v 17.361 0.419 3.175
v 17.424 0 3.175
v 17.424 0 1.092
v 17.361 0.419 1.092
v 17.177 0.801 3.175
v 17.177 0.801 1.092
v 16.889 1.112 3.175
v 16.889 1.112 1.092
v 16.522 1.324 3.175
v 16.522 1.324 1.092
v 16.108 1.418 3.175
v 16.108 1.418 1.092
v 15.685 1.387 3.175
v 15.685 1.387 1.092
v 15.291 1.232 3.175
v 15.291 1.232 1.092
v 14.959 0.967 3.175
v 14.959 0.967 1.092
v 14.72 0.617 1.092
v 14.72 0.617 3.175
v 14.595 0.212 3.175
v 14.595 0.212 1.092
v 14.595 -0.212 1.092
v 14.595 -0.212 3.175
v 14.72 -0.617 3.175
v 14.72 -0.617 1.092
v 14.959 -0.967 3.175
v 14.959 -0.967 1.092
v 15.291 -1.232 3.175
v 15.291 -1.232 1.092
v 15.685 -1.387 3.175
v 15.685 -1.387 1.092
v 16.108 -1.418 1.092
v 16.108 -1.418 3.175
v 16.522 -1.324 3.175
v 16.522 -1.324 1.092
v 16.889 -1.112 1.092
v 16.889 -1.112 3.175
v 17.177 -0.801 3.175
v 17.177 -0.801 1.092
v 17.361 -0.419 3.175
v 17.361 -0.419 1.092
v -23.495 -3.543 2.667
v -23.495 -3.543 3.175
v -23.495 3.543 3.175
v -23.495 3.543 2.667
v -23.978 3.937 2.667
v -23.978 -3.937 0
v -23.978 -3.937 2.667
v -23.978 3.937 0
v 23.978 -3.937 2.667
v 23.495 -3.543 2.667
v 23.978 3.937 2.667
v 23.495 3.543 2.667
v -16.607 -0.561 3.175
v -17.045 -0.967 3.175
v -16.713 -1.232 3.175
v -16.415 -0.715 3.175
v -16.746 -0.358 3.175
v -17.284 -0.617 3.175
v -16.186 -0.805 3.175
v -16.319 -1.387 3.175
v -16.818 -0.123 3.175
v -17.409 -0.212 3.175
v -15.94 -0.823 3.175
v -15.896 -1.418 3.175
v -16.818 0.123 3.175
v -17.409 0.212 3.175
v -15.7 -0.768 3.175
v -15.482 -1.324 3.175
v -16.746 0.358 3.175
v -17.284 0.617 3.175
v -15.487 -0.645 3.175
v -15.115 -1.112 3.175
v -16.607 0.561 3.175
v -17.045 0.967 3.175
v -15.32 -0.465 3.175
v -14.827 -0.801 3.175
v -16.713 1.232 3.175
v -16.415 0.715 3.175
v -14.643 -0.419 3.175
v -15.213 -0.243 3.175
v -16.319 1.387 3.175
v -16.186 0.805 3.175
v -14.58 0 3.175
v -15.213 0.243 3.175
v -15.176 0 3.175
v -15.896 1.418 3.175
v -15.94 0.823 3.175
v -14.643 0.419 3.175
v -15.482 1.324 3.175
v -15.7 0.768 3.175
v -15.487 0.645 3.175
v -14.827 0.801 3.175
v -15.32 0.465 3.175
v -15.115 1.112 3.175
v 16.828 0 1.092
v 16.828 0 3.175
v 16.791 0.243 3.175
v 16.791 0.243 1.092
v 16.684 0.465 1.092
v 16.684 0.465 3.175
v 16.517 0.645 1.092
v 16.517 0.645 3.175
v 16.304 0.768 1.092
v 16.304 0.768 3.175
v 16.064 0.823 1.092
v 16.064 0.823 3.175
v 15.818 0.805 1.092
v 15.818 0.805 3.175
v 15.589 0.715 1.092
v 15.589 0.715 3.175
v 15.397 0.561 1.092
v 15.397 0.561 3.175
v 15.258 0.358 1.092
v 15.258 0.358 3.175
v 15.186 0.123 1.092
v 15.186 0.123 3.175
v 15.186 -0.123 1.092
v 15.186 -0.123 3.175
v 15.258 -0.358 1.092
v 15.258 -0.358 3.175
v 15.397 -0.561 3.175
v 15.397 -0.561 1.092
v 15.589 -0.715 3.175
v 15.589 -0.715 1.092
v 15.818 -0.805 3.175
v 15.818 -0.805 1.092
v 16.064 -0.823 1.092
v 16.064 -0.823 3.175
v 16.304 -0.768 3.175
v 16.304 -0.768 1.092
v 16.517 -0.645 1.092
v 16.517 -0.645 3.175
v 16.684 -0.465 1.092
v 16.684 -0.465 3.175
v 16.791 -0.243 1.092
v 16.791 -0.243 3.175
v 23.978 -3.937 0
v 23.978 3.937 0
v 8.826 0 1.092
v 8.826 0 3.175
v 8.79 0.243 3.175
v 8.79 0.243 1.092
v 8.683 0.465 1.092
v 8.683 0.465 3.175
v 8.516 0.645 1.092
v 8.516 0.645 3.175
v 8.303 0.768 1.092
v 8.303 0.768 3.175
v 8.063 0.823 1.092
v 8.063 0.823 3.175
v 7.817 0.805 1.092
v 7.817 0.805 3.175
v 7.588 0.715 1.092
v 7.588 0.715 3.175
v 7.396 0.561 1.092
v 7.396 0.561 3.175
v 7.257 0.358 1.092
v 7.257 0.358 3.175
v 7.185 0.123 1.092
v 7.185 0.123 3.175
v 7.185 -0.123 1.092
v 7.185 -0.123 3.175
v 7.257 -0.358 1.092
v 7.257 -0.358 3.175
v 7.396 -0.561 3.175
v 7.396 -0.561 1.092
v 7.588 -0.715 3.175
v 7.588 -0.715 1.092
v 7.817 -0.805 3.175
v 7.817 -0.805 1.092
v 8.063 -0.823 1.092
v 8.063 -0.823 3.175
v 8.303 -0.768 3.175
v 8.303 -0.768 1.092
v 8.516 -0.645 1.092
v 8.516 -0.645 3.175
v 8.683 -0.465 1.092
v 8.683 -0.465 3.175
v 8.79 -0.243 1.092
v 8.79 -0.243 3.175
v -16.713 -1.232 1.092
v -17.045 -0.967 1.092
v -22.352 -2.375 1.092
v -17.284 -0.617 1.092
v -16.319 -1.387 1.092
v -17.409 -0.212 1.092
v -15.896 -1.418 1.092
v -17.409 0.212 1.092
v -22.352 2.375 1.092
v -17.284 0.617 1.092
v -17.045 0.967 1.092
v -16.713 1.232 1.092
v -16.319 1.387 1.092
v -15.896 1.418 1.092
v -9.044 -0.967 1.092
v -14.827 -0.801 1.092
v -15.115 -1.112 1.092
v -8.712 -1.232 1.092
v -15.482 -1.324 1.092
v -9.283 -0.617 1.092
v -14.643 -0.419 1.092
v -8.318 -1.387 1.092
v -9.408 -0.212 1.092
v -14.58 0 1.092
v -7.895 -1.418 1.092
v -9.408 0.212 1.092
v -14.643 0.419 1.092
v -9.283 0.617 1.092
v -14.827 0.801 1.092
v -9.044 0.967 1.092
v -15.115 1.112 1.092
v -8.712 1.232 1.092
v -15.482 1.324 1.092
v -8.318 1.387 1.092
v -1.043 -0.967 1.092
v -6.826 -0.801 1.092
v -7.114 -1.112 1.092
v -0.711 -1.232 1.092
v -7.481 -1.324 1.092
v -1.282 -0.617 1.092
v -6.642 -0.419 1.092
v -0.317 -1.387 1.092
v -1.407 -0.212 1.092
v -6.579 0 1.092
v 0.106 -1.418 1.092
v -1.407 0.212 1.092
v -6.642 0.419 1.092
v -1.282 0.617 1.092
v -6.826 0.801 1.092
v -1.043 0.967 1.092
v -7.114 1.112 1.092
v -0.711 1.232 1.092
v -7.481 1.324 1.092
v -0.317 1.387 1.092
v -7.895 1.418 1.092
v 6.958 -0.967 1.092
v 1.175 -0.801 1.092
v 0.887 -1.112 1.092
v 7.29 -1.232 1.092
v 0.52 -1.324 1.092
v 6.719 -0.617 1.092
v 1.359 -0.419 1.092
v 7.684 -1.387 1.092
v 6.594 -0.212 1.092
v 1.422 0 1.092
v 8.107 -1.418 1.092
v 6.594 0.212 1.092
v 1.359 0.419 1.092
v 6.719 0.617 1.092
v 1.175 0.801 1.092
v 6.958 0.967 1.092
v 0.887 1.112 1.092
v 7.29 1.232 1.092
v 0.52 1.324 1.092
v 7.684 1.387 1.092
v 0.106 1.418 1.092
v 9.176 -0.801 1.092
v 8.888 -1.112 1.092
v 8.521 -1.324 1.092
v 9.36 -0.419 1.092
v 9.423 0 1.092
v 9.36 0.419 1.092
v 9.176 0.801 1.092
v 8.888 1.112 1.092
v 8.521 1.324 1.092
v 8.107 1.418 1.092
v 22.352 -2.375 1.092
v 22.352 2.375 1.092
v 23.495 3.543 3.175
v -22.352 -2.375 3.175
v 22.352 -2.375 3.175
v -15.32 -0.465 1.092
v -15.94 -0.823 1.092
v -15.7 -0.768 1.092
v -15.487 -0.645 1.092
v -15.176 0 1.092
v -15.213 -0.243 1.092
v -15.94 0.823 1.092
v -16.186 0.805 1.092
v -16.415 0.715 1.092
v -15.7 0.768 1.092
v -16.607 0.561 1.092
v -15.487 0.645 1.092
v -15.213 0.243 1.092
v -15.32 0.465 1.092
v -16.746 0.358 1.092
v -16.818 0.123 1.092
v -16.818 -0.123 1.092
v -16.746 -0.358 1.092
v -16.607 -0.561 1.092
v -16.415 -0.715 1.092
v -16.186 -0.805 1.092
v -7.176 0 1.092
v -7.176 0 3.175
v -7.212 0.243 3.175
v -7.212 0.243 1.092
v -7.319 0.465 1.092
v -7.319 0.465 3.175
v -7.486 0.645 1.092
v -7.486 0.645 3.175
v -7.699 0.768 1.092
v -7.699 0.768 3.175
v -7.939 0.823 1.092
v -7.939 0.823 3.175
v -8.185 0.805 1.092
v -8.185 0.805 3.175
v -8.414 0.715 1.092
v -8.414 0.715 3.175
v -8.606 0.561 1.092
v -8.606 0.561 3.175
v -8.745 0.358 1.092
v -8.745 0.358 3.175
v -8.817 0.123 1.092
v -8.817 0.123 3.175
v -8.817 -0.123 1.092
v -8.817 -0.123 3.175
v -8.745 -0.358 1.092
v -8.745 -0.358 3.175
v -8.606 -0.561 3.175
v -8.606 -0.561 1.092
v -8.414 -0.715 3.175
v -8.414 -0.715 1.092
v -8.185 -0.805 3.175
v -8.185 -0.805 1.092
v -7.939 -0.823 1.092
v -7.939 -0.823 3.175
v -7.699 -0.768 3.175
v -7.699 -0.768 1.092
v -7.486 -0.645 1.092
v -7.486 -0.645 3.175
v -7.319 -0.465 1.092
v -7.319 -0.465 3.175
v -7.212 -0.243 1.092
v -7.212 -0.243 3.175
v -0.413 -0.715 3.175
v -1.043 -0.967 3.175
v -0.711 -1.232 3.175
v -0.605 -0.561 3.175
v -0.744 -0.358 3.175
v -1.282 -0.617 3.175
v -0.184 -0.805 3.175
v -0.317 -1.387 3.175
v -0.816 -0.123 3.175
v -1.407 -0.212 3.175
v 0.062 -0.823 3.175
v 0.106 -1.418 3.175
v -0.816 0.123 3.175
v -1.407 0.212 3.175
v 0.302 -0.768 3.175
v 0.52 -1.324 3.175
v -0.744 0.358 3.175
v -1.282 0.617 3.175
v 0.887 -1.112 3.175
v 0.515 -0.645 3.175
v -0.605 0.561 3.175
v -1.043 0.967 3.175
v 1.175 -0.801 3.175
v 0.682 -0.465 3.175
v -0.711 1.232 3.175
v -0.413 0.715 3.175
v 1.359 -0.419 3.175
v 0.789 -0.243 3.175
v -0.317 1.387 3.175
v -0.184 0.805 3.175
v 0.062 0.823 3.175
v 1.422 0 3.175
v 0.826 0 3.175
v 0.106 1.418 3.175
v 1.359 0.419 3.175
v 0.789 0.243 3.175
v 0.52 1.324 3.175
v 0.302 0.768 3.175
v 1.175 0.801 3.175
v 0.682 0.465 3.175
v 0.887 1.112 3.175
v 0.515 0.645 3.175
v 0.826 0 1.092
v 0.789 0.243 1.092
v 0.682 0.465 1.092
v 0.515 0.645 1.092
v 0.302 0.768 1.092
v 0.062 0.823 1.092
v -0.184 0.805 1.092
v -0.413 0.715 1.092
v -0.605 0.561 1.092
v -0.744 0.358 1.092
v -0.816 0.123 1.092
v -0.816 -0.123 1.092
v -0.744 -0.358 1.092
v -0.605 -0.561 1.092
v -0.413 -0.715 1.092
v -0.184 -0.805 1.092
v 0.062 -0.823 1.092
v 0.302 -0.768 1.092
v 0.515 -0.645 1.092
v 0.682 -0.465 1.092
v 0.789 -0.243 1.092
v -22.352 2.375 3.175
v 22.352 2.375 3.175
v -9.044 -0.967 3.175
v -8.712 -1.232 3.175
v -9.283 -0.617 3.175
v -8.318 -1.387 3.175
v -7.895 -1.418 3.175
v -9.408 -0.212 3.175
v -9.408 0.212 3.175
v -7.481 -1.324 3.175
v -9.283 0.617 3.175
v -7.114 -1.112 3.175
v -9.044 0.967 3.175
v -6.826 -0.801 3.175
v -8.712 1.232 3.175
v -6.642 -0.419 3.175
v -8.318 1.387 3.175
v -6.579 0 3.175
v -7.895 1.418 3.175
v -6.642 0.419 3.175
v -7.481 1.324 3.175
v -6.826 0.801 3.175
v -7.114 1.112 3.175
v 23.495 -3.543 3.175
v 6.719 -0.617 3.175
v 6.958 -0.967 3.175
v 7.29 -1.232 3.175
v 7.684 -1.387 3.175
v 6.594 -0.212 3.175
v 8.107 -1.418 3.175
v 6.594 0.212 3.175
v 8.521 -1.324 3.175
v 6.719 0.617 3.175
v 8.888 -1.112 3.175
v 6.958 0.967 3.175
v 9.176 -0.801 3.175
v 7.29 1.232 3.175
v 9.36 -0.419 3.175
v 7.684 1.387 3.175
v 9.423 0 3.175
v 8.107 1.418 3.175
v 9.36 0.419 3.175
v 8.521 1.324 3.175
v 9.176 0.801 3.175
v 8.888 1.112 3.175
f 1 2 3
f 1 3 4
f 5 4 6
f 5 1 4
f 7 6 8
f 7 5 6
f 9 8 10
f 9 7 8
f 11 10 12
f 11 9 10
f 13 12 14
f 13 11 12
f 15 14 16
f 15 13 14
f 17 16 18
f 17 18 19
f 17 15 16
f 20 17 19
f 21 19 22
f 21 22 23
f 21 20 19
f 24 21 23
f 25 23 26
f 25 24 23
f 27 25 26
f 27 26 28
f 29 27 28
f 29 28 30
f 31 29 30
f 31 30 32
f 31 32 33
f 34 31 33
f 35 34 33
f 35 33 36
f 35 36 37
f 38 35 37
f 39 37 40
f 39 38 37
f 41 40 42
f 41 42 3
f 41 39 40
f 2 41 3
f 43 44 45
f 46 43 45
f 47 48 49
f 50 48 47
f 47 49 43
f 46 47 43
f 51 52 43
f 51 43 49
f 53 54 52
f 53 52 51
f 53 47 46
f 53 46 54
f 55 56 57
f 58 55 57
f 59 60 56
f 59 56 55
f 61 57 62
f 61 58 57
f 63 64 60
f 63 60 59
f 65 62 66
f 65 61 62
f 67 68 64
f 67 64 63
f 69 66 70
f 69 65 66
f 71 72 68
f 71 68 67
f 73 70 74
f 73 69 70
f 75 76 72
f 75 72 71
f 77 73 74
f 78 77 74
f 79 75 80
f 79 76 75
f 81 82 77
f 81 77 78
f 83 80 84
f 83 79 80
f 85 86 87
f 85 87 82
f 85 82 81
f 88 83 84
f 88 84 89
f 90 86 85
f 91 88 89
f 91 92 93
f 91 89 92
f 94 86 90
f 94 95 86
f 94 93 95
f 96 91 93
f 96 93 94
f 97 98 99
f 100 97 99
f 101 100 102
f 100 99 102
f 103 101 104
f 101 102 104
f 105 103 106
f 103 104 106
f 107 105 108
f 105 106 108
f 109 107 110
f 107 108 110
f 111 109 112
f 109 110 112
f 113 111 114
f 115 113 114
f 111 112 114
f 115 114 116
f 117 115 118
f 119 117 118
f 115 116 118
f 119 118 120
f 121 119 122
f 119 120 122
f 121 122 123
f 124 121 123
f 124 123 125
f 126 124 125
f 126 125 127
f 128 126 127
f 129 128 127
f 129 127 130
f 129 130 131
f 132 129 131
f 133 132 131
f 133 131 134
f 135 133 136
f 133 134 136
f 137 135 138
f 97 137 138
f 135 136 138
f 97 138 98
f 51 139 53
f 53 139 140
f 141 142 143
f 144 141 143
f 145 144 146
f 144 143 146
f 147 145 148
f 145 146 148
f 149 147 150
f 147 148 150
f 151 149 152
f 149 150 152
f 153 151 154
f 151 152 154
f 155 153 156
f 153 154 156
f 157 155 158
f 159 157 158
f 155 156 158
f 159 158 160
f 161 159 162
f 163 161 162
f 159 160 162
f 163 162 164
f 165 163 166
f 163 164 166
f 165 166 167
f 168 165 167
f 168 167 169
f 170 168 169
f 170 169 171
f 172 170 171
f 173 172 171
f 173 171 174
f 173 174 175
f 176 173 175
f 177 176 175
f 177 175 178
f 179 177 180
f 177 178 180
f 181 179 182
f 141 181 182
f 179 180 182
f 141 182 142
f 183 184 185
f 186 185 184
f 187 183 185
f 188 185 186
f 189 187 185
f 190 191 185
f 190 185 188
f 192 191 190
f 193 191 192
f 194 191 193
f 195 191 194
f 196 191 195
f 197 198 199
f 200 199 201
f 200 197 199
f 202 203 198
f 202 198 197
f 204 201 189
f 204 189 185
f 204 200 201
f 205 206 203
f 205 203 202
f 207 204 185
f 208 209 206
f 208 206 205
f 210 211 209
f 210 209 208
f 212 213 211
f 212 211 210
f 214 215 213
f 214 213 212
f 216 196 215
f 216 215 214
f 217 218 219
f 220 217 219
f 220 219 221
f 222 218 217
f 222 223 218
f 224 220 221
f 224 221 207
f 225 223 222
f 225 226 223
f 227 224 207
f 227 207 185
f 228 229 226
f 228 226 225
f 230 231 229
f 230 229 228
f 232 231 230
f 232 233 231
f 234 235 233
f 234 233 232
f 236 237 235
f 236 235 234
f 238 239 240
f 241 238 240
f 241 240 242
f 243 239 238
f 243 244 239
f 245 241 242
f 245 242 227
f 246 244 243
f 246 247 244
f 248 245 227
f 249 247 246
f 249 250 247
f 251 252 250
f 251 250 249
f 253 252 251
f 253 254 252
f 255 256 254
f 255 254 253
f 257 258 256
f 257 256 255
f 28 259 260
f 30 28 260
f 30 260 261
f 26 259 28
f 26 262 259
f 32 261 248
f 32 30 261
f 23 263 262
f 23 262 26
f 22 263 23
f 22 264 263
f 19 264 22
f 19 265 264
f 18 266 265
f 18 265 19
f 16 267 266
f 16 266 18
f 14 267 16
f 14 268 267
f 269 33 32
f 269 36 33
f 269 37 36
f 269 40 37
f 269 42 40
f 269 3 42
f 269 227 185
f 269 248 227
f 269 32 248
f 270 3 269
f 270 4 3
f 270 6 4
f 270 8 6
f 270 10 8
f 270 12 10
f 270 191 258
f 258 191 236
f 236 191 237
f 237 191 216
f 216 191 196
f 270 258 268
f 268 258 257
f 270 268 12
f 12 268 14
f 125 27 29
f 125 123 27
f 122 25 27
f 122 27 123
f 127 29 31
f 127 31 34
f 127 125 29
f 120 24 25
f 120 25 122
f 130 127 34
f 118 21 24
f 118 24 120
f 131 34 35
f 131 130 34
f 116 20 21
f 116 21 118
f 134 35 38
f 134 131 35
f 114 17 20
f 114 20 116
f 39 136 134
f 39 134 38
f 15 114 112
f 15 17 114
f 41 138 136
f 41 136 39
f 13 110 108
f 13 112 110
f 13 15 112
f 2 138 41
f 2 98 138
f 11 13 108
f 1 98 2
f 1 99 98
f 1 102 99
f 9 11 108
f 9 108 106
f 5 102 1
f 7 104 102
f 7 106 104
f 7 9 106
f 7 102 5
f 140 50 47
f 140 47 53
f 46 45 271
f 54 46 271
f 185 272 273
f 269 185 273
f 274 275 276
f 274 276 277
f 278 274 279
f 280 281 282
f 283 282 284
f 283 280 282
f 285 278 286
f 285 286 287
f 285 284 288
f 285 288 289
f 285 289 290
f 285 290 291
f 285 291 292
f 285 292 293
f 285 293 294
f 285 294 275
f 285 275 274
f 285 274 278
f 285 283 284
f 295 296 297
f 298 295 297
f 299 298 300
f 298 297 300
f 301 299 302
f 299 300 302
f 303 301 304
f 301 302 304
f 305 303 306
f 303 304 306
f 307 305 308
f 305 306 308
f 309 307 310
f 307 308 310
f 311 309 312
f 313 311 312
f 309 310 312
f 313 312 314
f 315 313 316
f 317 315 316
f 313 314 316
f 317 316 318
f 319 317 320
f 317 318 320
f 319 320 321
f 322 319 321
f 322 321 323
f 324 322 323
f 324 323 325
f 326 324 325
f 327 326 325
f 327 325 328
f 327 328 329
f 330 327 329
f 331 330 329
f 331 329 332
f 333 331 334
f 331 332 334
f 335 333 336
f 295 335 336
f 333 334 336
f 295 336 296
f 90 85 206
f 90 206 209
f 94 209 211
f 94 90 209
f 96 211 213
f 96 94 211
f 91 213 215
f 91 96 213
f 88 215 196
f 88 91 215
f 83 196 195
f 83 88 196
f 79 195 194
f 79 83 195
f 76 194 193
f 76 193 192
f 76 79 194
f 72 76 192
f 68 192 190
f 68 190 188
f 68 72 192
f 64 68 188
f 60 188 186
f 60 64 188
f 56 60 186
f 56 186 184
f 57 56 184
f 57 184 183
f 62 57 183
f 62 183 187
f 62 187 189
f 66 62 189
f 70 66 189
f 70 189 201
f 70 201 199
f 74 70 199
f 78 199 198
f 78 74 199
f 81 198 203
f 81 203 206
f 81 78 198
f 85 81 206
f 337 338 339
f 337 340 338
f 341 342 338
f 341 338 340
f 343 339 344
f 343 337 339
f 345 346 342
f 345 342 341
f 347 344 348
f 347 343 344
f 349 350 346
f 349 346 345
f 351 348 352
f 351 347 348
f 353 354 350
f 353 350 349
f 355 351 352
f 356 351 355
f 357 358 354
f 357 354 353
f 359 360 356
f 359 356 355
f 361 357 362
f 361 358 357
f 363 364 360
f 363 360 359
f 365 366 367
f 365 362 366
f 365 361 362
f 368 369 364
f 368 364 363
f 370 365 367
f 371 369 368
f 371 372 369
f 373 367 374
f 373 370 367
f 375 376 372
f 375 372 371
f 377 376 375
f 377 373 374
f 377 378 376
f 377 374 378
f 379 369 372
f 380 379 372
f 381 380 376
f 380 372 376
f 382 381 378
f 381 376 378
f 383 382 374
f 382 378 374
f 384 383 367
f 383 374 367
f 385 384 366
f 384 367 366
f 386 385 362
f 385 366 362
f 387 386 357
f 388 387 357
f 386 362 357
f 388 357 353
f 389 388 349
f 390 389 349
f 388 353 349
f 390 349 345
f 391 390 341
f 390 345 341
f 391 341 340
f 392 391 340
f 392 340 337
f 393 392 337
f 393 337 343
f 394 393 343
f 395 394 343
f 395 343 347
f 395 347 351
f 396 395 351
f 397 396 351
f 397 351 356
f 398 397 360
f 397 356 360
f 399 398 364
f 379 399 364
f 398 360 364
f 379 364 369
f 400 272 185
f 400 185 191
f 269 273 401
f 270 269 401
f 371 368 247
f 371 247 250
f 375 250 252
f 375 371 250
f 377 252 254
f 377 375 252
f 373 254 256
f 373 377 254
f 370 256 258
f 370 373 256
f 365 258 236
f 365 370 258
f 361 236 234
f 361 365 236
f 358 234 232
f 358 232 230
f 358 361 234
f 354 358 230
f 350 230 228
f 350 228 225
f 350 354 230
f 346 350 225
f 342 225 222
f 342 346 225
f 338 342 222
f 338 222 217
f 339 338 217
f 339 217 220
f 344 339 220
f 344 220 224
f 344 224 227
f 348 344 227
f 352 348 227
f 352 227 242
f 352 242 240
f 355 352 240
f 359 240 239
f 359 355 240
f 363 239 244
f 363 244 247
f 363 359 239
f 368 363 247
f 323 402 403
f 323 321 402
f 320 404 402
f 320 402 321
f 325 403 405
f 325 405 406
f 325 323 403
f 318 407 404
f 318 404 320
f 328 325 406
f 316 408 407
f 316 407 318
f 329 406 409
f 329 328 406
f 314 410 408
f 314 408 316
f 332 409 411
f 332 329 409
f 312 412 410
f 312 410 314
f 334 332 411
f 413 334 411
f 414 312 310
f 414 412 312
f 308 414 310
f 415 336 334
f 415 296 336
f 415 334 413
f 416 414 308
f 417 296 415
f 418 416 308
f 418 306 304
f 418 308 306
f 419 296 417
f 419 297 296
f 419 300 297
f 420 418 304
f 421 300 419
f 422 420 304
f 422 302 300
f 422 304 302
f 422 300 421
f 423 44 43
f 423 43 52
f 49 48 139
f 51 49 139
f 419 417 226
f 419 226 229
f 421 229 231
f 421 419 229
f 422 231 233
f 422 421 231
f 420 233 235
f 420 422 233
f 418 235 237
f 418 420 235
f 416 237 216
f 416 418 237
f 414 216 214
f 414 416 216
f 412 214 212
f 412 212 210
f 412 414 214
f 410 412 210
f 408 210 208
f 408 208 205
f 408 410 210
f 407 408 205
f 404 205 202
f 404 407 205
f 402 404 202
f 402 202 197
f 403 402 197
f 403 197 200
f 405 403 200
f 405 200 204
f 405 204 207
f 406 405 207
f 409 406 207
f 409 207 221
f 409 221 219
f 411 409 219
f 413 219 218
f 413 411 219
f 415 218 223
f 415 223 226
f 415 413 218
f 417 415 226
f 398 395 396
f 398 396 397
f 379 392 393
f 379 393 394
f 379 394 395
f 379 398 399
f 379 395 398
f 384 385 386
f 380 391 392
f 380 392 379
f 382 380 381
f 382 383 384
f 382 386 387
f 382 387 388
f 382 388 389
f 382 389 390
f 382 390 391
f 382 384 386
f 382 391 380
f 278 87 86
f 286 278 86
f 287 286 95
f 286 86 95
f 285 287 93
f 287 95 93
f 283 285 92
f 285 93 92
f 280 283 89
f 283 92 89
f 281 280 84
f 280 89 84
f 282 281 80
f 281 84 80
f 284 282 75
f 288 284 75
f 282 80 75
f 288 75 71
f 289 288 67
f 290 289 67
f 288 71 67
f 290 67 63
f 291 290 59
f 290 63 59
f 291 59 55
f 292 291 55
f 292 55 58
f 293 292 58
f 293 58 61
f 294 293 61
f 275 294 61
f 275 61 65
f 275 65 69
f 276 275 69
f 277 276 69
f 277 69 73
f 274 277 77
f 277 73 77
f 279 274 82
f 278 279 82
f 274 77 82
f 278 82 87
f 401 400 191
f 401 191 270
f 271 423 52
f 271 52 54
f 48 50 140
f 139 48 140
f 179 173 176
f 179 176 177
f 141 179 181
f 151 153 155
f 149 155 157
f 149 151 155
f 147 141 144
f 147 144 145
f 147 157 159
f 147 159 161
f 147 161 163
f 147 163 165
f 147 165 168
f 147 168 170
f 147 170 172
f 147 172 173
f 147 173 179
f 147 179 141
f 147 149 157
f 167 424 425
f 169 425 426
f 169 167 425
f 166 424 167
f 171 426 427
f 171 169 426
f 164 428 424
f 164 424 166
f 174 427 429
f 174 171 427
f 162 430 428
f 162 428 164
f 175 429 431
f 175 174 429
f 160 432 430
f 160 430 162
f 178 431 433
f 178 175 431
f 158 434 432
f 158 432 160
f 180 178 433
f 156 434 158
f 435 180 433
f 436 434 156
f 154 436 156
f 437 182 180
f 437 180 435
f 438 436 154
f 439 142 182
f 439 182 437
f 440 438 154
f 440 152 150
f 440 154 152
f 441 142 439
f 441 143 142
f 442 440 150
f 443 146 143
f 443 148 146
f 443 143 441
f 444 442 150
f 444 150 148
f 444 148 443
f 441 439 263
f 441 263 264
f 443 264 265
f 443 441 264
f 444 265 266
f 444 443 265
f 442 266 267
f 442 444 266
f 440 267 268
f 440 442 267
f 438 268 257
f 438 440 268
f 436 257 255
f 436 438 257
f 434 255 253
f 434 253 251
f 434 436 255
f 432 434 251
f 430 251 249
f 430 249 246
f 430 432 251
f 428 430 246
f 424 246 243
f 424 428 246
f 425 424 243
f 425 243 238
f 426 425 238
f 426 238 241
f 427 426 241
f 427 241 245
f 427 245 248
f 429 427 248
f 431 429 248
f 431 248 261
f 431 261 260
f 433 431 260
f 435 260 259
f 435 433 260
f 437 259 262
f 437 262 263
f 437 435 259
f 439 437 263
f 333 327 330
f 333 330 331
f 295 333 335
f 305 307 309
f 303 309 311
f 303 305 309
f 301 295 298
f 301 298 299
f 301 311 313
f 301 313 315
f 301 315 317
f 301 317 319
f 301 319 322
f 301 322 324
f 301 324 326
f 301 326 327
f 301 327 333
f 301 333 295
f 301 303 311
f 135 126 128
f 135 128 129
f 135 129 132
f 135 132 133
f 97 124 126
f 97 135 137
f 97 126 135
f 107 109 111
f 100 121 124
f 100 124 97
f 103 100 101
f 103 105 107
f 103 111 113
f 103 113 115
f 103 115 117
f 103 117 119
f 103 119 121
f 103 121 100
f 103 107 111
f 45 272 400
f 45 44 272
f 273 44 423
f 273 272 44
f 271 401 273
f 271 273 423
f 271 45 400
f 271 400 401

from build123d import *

# Parameters (mm, degrees)
F0_W     = 47.9552
F0_H     = 7.874
F1_DEPTH = 3.175
F2_W     = 44.704
F2_H     = 4.7498
F2_R     = 1.4224
F3_DEPTH = 2.0828
F2_R_2   = 0.8255
F4_DEPTH = 2.0828
F5_W     = 49.073476
F5_H     = 9.354642
F5_W_2   = 46.99
F5_H_2   = 7.0866
F6_DEPTH = 0.508


with BuildPart() as f1:
    # F0 (on Top) → F1 (new body)
    with BuildSketch(Plane.XY):
        Rectangle(F0_W, F0_H)
    extrude(amount=F1_DEPTH)

    # F2 (on face) → F3 (cut)
    with BuildSketch(Plane.XY.offset(3.175)):
        Rectangle(F2_W, F2_H)
        with Locations((-16.002, 0)):
            Circle(F2_R, mode=Mode.SUBTRACT)
        with Locations((-8.001, 0)):
            Circle(F2_R, mode=Mode.SUBTRACT)
        Circle(F2_R, mode=Mode.SUBTRACT)
        with Locations((8.001, 0)):
            Circle(F2_R, mode=Mode.SUBTRACT)
        with Locations((16.002, 0)):
            Circle(F2_R, mode=Mode.SUBTRACT)
    extrude(amount=-F3_DEPTH, mode=Mode.SUBTRACT)

    # F2 (on face) → F4 (cut)
    with BuildSketch(Plane.XY.offset(3.175)):
        with Locations((16.002, 0)):
            Circle(F2_R_2)
        with Locations((8.001, 0)):
            Circle(F2_R_2)
        with Locations((-8.001, 0)):
            Circle(F2_R_2)
        Circle(F2_R_2)
        with Locations((-16.002, 0)):
            Circle(F2_R_2)
    extrude(amount=-F4_DEPTH, mode=Mode.SUBTRACT)

    # F5 (on face) → F6 (cut)
    with BuildSketch(Plane.XY.offset(3.175)):
        Rectangle(F5_W, F5_H)
        Rectangle(F5_W_2, F5_H_2, mode=Mode.SUBTRACT)
    extrude(amount=-F6_DEPTH, mode=Mode.SUBTRACT)


solid = f1.part
